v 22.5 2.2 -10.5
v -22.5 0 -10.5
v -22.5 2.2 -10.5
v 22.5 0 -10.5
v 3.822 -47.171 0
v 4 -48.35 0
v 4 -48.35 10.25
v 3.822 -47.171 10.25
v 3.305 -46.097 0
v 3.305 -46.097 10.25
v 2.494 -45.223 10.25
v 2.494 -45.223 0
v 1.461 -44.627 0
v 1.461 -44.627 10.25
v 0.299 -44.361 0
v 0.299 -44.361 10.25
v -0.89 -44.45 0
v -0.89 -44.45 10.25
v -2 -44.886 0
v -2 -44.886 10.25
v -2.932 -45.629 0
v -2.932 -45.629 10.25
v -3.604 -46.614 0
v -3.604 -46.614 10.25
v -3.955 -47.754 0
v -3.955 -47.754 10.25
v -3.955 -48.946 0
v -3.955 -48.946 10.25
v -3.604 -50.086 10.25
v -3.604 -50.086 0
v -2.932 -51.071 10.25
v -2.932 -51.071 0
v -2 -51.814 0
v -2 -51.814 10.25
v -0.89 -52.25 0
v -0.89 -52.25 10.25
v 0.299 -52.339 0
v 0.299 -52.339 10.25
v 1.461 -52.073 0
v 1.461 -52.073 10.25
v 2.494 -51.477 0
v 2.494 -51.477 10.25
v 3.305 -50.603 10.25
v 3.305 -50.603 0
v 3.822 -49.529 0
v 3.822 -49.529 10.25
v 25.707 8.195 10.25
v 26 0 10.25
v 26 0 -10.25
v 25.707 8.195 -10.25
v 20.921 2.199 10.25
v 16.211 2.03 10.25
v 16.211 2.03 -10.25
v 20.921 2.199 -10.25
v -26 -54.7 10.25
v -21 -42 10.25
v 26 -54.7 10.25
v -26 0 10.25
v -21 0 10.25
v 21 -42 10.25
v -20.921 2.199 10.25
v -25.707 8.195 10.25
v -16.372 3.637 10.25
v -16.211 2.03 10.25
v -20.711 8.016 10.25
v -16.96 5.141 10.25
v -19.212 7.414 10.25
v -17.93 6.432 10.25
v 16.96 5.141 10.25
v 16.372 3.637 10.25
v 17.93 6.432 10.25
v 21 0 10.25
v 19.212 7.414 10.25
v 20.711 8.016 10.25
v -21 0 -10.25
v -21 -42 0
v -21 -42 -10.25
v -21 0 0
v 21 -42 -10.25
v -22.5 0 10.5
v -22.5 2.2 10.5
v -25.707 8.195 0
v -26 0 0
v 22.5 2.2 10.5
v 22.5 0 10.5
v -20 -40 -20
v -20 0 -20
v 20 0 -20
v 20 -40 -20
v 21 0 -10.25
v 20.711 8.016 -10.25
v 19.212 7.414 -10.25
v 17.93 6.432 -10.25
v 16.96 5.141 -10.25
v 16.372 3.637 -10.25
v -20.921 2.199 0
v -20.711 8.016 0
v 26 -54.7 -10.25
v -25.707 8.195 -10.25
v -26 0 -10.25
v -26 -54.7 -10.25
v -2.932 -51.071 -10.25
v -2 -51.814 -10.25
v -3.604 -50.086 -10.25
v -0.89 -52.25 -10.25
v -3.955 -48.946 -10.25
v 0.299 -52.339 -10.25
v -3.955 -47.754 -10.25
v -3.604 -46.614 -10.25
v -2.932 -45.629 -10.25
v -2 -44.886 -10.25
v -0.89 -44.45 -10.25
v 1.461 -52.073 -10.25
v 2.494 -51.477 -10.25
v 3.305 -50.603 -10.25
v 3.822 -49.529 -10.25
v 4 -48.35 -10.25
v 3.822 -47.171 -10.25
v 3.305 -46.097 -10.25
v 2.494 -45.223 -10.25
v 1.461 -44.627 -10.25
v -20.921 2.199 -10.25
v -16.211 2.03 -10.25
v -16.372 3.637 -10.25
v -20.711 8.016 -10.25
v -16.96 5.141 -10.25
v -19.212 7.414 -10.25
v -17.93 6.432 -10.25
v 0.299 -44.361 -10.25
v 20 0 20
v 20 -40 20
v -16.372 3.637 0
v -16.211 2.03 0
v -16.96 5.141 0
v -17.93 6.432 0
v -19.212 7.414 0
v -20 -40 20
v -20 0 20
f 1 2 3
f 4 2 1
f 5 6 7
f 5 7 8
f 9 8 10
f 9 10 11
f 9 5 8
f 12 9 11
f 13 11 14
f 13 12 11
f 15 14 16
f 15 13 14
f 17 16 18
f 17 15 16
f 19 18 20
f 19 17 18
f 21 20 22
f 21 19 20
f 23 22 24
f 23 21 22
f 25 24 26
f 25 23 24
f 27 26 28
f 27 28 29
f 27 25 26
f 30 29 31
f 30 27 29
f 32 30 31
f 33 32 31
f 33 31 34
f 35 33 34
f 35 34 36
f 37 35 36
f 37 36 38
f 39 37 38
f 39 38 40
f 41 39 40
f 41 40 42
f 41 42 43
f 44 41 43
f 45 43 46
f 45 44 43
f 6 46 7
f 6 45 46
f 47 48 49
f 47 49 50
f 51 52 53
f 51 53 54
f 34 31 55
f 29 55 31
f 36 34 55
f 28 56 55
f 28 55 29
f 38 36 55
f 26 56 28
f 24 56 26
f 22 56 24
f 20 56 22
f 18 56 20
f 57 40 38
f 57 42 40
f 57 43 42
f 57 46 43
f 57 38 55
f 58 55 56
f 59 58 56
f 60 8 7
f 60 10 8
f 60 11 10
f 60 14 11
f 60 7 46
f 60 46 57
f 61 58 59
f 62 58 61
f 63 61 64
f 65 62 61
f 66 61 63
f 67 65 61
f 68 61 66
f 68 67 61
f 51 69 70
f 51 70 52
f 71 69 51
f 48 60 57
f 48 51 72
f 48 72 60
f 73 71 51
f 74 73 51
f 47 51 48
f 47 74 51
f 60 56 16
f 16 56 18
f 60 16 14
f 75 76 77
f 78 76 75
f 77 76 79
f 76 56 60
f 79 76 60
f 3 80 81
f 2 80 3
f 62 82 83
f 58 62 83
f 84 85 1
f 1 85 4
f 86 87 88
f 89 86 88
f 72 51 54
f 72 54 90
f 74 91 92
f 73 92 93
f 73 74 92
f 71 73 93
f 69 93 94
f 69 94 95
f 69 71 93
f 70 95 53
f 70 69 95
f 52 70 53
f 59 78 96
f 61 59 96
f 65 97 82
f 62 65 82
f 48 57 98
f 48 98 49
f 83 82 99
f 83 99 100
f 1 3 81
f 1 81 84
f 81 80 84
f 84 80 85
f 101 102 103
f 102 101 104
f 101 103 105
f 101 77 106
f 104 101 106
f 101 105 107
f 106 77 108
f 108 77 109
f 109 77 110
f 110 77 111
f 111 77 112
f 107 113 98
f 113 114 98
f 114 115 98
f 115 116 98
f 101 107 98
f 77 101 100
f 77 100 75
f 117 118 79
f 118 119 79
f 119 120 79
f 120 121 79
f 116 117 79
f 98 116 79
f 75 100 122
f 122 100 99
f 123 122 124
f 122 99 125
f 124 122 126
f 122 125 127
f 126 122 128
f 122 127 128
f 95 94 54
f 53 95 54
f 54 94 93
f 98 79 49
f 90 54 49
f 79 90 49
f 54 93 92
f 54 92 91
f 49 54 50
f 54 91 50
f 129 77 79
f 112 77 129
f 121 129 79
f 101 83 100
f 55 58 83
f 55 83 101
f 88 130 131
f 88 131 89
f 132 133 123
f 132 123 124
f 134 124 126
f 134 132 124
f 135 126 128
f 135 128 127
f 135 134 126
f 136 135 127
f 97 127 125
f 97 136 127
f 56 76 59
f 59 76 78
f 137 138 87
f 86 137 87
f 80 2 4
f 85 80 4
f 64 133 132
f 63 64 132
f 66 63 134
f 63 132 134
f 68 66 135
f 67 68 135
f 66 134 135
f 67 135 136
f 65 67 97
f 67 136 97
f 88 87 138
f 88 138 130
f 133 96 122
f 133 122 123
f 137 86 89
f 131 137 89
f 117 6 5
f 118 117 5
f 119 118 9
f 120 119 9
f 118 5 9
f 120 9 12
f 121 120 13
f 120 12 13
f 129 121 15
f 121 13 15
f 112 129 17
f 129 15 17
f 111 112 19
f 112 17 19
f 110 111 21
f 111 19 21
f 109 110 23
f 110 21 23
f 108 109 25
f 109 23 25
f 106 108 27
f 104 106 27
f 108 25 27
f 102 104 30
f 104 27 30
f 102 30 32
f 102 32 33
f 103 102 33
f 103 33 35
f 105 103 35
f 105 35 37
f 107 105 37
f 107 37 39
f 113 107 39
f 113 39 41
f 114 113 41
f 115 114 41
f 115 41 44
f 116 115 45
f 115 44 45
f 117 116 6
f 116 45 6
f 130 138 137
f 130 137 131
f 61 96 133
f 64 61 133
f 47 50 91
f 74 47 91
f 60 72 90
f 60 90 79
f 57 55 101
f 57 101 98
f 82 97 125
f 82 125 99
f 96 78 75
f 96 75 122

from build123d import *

# Parameters (mm, degrees)
SKETCH1_W                            = 45
SKETCH1_H                            = 21
BOSS_EXTRUDE1_DEPTH                  = 2.2
SKETCH2_W                            = 40
SKETCH2_H                            = 40
BOSS_EXTRUDE2_DEPTH                  = 40
SKETCH3_W                            = 42
SKETCH3_H                            = 12.7
SKETCH3_R                            = 4
SNAPFIT_42MM_SPACING_5MM_WIDTH_DEPTH = 10.25


with BuildPart() as part:
    # Sketch1 → Boss-Extrude1 (new body)
    with BuildSketch(Plane(origin=(0, 0, 0), x_dir=(1, 0, 0), z_dir=(0, 1, 0))):
        Rectangle(SKETCH1_W, SKETCH1_H)
    extrude(amount=BOSS_EXTRUDE1_DEPTH)


with BuildPart() as body_2:
    # Sketch2 → Boss-Extrude2 (new body)
    with BuildSketch(Plane(origin=(0, 0, 0), x_dir=(1, 0, 0), z_dir=(0, 1, 0))):
        Rectangle(SKETCH2_W, SKETCH2_H)
    extrude(amount=-BOSS_EXTRUDE2_DEPTH)


with BuildPart() as body_3:
    # Sketch3 → SnapFit-42mm_spacing-5mm_width (new, symmetric)
    # profile 1 of 3: a face of its own
    with BuildSketch(Plane.XY):
        with Locations((0, -48.35)):
            Rectangle(SKETCH3_W, SKETCH3_H)
        with Locations((0, -48.35)):
            Circle(SKETCH3_R, mode=Mode.SUBTRACT)
    # profile 2 of 3: a face of its own
    with BuildSketch(Plane.XY):
        with BuildLine():
            Line((-26, -54.7), (-21, -54.7))
            Line((-21, -54.7), (-21, -42))
            Line((-21, -42), (-21, 0))
            Line((-21, 0), (-20.921478633, 2.19859828))
            Line((-20.921478633, 2.19859828), (-16.210515178, 2.030349585))
            ThreePointArc((-16.210515178, 2.030349585), (-17.401240008, 5.819652348), (-20.710515178, 8.016317753))
            Line((-20.710515178, 8.016317753), (-25.70732945, 8.194775406))
            Line((-25.70732945, 8.194775406), (-26, 0))
            Line((-26, 0), (-26, -54.7))
        make_face()
    # profile 3 of 3: a face of its own
    with BuildSketch(Plane.XY):
        with BuildLine():
            Line((21, -42), (21, -54.7))
            Line((21, -54.7), (26, -54.7))
            Line((26, -54.7), (26, 0))
            Line((26, 0), (25.70732945, 8.194775406))
            Line((25.70732945, 8.194775406), (20.710515178, 8.016317753))
            ThreePointArc((20.710515178, 8.016317753), (17.401240008, 5.819652348), (16.210515178, 2.030349585))
            Line((16.210515178, 2.030349585), (20.921478633, 2.19859828))
            Line((20.921478633, 2.19859828), (21, 0))
            Line((21, 0), (21, -42))
        make_face()
    extrude(amount=SNAPFIT_42MM_SPACING_5MM_WIDTH_DEPTH, both=True)


solid = Compound([part.part, body_2.part, body_3.part])
